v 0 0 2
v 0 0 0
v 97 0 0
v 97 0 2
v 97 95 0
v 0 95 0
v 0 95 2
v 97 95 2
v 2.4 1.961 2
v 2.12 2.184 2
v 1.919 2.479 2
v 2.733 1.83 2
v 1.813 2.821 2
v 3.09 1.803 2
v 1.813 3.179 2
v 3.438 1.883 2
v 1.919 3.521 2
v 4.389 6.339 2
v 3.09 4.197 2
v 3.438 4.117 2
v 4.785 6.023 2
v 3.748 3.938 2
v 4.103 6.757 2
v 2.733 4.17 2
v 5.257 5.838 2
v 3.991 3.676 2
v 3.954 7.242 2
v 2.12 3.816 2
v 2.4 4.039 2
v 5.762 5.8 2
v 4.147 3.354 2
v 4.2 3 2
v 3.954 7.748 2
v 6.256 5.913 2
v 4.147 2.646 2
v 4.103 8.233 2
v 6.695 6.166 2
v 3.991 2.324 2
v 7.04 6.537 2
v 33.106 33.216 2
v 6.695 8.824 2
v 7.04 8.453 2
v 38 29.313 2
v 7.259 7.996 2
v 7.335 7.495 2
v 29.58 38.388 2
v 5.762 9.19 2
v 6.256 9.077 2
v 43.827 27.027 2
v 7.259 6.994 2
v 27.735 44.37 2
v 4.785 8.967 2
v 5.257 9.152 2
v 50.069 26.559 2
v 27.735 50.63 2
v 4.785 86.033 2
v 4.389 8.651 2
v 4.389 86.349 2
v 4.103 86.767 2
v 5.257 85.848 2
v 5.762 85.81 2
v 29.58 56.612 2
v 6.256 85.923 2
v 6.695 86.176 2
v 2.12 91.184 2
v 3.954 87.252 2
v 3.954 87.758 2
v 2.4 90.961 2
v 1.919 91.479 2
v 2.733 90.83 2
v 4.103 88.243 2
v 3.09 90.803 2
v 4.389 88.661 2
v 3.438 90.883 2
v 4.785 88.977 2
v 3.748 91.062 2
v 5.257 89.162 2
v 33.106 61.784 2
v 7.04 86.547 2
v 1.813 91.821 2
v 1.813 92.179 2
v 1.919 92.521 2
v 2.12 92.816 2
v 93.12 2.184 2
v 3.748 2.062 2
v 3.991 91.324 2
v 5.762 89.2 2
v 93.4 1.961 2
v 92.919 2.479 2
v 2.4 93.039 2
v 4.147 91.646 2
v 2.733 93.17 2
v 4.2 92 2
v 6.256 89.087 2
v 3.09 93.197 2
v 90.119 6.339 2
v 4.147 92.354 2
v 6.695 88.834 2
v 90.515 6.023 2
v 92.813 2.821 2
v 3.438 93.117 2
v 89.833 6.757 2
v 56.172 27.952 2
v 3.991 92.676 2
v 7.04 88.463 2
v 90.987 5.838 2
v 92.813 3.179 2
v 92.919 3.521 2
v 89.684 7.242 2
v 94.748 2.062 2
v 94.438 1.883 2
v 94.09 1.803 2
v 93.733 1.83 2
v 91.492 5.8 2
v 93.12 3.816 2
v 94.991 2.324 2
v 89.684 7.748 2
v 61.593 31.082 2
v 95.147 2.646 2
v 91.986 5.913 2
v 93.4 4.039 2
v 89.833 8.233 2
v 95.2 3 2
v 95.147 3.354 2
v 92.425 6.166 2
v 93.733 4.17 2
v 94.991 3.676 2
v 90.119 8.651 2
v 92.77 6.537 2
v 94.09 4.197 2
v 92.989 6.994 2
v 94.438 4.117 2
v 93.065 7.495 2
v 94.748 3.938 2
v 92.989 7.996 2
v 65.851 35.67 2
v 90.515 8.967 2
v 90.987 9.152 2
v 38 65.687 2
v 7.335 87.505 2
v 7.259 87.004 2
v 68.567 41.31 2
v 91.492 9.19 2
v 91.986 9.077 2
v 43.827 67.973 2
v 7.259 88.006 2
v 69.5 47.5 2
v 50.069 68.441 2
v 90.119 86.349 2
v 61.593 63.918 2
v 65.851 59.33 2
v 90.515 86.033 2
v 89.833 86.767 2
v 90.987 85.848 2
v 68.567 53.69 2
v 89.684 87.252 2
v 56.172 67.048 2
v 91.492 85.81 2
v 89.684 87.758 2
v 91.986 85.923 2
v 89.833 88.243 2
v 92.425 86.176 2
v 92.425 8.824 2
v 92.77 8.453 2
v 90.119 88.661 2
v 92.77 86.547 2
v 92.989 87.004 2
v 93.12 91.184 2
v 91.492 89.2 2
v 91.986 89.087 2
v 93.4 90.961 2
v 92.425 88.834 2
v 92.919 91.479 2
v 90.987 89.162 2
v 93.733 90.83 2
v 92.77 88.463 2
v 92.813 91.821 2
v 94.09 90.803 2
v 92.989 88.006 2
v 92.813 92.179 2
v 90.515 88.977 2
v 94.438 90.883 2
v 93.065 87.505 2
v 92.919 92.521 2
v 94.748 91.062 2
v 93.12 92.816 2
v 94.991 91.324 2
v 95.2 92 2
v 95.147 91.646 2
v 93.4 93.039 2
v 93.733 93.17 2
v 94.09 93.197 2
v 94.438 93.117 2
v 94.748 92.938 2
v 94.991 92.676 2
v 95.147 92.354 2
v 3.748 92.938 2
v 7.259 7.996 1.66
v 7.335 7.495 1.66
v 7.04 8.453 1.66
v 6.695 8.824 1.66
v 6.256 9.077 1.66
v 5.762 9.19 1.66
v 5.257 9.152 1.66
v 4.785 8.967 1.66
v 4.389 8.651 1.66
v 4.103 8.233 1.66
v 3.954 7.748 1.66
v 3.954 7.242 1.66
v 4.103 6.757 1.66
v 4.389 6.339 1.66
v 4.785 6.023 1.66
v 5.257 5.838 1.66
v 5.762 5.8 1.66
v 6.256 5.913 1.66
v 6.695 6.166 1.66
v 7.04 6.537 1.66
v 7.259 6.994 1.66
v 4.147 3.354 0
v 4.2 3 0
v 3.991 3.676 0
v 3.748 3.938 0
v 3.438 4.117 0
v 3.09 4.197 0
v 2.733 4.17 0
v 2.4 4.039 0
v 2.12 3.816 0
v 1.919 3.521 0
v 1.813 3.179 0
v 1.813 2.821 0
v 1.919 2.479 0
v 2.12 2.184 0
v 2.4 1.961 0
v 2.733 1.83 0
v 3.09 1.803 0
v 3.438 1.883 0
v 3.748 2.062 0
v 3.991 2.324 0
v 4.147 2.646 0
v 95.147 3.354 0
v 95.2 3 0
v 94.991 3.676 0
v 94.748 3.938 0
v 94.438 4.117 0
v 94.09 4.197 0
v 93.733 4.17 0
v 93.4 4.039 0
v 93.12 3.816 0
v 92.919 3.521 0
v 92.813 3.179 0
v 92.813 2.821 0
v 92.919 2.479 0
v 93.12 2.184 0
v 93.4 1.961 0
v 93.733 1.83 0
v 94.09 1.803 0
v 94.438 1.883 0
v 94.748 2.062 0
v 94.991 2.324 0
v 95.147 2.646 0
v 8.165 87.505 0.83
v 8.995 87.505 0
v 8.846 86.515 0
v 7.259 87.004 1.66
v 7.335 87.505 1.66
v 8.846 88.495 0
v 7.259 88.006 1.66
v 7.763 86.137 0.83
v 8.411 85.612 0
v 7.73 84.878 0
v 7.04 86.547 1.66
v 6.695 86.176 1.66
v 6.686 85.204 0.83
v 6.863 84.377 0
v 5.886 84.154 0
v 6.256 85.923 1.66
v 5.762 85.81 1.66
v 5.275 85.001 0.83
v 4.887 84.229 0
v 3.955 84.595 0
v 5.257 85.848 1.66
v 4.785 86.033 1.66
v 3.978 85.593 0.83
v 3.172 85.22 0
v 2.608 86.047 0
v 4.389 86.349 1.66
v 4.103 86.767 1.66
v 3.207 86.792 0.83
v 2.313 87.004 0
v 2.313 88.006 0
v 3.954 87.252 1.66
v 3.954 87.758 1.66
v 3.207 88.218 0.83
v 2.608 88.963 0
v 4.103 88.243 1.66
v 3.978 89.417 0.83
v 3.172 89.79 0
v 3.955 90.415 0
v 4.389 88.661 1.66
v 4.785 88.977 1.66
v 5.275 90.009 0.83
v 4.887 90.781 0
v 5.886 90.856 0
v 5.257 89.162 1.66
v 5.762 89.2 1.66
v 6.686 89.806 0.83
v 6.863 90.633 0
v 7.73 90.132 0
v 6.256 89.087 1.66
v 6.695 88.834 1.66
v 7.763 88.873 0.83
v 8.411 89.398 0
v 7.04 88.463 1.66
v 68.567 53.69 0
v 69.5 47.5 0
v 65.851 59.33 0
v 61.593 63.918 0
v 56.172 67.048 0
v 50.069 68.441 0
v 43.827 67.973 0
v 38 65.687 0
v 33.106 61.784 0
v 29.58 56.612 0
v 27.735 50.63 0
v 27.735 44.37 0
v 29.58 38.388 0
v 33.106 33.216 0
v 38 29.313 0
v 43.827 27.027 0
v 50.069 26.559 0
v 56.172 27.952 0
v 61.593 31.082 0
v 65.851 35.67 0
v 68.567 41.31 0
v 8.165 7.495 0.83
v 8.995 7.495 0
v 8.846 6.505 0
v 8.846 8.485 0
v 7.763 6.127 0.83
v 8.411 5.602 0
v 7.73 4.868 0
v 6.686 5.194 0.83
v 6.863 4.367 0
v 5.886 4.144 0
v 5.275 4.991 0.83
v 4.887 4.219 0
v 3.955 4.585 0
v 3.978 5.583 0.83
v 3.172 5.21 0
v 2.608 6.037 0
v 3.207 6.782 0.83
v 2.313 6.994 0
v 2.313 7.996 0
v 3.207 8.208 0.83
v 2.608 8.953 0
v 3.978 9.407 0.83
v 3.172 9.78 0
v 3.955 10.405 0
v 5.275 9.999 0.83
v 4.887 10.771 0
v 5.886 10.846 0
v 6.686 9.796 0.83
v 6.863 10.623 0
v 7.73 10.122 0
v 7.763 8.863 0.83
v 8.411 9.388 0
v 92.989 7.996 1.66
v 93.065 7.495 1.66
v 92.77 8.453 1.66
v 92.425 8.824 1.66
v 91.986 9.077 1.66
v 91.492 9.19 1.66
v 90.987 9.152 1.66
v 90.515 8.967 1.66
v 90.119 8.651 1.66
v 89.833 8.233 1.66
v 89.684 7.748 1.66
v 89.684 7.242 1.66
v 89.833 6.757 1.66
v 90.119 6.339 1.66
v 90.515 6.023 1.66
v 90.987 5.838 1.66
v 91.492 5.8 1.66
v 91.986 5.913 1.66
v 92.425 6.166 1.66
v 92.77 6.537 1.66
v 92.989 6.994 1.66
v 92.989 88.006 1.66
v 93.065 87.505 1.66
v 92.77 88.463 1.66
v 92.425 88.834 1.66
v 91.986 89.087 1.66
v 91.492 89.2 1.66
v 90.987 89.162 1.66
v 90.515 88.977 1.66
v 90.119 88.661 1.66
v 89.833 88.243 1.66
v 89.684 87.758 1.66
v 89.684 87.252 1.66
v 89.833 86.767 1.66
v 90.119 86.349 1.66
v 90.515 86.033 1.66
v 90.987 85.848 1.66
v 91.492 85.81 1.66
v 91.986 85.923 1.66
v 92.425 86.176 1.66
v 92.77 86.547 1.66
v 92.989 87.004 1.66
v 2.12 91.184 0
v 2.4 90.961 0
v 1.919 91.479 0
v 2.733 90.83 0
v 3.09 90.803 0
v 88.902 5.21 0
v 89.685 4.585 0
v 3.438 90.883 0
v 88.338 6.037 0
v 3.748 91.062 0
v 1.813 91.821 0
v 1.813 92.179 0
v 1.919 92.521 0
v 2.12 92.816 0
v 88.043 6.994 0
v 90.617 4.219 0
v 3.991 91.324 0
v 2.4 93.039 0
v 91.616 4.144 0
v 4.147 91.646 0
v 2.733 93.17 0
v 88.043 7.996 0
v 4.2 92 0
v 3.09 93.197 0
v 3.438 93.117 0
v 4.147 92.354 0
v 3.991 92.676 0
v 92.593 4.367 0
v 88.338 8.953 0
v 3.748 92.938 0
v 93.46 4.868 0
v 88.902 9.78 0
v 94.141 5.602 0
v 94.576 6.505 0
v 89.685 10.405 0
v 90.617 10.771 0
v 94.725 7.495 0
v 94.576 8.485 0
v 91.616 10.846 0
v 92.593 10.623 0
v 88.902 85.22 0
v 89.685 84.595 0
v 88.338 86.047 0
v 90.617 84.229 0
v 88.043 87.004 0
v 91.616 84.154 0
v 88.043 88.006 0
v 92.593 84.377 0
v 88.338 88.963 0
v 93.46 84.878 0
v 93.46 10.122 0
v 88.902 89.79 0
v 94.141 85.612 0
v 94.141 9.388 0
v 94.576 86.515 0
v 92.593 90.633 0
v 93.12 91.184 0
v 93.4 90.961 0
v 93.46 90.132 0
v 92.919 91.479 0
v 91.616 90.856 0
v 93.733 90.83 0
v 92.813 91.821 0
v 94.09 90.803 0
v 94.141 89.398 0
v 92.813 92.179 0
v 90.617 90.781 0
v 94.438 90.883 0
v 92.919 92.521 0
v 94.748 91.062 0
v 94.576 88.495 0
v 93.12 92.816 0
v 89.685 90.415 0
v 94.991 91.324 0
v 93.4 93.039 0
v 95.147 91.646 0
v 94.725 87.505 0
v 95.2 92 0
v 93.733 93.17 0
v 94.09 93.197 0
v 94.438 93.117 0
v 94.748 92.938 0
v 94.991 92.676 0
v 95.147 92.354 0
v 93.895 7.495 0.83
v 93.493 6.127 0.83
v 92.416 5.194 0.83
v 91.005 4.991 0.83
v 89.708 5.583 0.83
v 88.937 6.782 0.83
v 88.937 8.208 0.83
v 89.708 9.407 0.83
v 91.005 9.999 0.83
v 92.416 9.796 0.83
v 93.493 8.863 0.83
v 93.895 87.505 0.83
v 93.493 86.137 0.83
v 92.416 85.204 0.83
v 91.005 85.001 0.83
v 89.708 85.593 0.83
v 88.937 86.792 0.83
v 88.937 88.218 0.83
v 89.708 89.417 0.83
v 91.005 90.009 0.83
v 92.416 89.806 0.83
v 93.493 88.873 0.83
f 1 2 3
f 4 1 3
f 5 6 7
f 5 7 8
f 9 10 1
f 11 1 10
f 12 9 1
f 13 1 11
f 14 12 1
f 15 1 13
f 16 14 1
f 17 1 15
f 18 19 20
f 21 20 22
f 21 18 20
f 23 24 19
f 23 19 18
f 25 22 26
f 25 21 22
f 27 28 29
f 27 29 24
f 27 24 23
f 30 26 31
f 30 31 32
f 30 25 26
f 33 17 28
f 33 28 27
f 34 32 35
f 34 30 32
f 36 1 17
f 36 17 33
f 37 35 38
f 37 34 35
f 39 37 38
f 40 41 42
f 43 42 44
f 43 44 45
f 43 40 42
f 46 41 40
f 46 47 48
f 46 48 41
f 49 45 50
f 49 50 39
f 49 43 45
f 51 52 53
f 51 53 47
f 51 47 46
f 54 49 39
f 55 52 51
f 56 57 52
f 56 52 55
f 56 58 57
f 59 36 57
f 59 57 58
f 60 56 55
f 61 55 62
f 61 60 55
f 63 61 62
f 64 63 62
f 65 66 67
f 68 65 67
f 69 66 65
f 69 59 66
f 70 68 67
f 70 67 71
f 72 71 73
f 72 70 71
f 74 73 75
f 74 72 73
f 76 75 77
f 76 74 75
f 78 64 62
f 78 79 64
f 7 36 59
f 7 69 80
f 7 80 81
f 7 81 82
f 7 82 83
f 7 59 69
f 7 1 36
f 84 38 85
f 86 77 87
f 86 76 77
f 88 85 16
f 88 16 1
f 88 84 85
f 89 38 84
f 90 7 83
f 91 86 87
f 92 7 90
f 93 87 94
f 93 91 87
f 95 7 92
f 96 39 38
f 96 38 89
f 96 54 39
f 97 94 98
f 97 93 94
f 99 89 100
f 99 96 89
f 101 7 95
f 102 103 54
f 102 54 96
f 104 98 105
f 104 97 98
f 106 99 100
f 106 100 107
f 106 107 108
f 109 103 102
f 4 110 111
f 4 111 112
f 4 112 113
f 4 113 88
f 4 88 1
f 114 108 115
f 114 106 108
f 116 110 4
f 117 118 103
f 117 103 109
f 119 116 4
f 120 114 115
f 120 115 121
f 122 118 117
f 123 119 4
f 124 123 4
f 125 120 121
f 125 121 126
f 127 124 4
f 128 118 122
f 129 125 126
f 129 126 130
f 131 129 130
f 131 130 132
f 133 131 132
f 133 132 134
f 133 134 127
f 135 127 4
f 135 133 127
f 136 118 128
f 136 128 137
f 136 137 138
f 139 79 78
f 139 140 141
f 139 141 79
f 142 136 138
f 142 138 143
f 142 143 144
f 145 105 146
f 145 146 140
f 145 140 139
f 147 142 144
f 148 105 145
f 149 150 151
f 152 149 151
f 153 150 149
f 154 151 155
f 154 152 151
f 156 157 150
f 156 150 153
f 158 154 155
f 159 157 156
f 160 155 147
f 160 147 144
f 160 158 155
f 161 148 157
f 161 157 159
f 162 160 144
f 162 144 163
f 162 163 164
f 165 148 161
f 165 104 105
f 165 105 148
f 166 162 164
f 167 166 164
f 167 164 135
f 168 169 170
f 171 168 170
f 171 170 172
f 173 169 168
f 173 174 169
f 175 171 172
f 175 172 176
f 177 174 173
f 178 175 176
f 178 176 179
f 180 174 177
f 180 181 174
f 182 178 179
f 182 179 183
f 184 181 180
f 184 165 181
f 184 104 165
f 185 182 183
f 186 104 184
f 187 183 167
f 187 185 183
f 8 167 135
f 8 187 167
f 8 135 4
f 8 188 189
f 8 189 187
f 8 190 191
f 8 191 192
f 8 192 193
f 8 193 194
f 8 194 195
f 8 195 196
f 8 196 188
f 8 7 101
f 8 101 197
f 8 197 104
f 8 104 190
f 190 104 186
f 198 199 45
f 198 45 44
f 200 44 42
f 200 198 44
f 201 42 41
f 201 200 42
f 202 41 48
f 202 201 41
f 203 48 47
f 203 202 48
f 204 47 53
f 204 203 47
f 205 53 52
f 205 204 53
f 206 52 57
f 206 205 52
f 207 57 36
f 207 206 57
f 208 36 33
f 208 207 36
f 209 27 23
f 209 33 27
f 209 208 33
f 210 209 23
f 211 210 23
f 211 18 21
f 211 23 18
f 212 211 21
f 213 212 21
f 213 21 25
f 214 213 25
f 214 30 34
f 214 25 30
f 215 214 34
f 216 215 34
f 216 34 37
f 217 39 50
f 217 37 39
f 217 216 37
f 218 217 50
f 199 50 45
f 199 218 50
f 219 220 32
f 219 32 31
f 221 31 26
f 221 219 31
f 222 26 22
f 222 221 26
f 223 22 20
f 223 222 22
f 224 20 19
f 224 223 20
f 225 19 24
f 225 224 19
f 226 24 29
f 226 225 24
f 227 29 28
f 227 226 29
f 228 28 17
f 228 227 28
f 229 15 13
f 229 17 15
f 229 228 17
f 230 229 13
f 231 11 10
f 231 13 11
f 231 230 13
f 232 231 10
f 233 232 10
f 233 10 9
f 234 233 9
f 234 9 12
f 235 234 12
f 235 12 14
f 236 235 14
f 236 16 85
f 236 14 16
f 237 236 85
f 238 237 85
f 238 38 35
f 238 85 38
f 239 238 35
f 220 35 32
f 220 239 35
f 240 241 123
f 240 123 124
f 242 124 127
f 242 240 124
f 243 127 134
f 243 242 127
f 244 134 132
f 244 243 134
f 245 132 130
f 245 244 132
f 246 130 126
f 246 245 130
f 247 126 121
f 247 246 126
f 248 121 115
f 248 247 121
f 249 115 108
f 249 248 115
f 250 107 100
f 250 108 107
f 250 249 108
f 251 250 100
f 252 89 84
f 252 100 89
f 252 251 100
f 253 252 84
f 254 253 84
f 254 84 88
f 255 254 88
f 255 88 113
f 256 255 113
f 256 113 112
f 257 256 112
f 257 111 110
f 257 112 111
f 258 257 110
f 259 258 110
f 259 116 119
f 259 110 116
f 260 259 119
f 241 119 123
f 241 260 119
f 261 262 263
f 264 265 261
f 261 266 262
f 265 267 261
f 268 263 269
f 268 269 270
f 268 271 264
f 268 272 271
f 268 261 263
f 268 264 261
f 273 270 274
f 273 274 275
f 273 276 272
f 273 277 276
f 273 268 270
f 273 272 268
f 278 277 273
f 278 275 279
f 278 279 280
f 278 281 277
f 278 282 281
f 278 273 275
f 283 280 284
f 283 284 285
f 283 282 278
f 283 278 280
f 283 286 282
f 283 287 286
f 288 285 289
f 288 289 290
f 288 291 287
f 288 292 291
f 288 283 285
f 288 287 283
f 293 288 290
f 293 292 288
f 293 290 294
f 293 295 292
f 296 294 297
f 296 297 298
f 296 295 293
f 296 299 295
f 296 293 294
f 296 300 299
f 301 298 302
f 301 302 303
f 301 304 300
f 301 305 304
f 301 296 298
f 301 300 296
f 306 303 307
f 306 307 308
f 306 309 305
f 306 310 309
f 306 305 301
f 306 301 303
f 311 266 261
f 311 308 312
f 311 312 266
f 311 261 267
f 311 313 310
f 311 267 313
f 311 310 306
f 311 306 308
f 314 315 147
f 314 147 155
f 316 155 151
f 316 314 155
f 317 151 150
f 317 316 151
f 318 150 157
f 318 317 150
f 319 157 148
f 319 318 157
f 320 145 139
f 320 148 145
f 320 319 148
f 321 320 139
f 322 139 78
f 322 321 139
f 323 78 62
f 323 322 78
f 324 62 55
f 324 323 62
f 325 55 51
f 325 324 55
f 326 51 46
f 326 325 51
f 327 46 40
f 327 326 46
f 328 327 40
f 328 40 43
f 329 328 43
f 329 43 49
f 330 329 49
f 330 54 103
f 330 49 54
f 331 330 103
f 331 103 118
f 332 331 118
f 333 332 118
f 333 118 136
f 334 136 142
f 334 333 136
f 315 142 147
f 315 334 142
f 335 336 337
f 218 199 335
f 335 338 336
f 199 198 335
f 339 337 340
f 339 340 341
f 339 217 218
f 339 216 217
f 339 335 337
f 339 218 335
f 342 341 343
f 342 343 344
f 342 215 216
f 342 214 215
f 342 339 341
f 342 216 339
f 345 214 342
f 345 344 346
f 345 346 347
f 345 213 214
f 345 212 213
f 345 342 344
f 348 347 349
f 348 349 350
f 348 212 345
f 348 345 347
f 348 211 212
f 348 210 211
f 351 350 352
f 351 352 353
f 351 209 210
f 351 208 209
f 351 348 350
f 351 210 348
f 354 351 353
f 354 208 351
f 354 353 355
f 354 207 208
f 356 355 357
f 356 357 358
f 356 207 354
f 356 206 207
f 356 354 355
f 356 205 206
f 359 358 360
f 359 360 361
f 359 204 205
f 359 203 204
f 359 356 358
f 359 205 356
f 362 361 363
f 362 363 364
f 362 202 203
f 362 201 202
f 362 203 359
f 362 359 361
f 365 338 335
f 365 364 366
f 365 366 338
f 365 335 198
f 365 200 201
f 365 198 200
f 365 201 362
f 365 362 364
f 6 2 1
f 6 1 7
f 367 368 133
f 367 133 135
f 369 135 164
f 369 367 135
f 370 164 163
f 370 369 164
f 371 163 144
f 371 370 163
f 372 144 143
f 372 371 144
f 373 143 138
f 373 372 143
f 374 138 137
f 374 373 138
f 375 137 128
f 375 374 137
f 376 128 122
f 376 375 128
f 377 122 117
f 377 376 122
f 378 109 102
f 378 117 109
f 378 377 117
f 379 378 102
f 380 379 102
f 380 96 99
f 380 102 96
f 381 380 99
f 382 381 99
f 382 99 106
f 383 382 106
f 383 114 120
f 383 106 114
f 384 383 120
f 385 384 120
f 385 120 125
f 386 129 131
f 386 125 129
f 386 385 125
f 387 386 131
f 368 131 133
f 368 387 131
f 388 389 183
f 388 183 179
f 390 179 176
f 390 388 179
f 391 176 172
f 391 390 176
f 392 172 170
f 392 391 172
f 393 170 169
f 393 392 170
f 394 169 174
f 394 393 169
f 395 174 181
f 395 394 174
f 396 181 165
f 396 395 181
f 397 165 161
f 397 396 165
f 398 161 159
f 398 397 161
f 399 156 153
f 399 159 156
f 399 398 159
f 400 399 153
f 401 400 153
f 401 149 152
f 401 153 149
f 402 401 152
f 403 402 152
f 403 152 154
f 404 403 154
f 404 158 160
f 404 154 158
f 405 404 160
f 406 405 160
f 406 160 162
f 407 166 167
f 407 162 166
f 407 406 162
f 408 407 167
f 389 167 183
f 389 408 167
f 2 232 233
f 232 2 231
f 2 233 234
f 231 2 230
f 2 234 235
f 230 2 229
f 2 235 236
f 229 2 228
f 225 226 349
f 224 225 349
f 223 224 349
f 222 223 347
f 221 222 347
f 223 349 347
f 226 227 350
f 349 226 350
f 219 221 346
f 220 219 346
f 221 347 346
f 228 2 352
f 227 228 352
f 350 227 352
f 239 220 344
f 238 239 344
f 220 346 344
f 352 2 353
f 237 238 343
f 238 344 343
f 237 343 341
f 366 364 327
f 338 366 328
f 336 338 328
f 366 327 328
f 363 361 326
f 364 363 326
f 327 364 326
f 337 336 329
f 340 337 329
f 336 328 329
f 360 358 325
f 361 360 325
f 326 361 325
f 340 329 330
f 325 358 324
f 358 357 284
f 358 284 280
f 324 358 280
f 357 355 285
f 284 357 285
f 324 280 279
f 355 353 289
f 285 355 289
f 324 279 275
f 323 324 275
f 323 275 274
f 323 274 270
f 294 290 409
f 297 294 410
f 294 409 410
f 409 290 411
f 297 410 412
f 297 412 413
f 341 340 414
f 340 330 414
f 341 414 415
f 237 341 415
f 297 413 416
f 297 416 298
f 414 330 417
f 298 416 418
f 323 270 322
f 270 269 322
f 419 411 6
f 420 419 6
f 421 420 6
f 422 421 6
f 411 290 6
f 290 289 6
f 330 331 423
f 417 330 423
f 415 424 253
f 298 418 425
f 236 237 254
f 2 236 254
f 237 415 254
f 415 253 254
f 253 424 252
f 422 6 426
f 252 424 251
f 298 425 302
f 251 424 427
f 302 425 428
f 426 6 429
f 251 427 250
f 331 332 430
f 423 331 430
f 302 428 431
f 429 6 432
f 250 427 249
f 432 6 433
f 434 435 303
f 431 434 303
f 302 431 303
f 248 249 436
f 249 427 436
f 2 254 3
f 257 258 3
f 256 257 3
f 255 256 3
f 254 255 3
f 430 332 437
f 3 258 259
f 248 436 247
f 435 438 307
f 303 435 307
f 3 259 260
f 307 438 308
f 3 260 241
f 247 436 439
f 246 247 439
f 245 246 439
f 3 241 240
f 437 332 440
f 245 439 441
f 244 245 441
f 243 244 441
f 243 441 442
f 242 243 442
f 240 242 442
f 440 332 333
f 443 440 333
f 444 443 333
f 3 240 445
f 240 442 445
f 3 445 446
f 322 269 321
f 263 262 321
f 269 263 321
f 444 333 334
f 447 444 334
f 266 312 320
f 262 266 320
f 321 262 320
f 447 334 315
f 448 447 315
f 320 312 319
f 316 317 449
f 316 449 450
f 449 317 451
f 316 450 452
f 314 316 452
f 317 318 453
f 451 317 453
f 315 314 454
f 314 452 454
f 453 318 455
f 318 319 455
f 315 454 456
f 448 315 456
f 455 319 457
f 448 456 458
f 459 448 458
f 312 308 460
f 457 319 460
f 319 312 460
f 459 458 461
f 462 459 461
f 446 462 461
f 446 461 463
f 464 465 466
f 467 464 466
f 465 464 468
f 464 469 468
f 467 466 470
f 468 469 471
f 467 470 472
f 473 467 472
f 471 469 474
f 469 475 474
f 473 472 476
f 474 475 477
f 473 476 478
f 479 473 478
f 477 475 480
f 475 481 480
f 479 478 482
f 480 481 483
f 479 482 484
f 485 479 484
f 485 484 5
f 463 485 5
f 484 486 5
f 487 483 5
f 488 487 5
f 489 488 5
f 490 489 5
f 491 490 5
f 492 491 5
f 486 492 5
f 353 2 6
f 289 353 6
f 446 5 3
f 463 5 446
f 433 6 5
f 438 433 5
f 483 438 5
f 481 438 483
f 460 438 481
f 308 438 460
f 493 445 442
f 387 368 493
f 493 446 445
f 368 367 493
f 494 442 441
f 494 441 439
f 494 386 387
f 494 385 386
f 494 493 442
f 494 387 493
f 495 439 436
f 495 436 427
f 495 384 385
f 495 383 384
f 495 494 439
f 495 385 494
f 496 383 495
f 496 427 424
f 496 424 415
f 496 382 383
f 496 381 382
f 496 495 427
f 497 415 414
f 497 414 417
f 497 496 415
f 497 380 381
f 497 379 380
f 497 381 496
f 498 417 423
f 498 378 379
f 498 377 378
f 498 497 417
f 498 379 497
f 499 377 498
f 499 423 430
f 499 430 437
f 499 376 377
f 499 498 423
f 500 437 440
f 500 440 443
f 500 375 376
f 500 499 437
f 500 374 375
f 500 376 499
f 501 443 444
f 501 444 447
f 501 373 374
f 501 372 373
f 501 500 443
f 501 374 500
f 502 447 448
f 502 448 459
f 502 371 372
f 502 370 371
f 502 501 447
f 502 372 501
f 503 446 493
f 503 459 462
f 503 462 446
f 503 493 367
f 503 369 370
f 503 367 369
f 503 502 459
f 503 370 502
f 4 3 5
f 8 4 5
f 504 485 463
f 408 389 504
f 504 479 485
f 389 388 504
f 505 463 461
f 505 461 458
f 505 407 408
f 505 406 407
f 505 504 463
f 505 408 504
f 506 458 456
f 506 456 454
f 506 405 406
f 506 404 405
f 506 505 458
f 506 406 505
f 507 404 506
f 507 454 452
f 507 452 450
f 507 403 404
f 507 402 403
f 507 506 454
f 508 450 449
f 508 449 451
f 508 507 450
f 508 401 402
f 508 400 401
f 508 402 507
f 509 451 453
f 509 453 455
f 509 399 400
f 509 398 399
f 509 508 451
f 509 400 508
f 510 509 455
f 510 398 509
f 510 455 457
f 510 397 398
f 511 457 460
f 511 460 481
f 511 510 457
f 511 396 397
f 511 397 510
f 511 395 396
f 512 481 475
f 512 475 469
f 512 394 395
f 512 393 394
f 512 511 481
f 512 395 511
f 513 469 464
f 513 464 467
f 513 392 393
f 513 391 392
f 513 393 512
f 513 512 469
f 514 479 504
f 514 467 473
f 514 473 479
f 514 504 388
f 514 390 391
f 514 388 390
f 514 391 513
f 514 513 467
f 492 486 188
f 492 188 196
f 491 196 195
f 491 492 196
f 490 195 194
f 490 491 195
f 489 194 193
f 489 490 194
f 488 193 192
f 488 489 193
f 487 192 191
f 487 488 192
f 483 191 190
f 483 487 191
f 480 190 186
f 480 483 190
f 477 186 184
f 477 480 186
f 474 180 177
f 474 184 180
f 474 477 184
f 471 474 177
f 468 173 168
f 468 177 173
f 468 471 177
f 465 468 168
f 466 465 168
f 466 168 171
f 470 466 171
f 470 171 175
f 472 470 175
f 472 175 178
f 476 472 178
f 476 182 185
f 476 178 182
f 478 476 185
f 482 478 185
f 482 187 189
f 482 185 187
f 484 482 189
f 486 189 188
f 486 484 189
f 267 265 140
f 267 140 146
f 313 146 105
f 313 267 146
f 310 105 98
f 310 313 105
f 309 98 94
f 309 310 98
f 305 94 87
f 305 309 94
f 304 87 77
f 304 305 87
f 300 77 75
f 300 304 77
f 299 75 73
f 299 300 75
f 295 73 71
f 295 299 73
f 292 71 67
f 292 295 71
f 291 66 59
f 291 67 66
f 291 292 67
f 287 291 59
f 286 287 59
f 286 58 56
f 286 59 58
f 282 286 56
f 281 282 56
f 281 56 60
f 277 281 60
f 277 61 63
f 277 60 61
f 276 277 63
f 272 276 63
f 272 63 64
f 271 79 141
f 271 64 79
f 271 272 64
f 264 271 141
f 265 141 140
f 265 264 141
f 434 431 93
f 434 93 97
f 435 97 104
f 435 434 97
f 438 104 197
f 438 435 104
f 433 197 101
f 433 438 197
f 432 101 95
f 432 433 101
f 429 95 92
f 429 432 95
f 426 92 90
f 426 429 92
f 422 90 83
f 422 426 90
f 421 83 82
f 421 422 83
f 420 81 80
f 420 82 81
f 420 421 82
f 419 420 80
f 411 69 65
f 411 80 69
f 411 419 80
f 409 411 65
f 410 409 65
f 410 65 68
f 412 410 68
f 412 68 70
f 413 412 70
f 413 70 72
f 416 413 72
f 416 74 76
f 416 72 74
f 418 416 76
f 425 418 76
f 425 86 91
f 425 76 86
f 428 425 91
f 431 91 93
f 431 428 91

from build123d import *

# Parameters (mm, degrees)
PLATE_SKETCH_W                 = 97
PLATE_SKETCH_H                 = 95
PLATE_DEPTH                    = 2
M2_FOOT_SCREW_HOLES_DEPTH      = 136.786597277
M2_FOOT_SCREW_HOLES_DEPTH_BACK = 136.786597277
M2_FOOT_SCREW_HOLES_SKETCH_R   = 1.2
M3_STACK_ROD_HOLES_DEPTH       = 136.786597277
M3_STACK_ROD_HOLES_DEPTH_BACK  = 136.786597277
M3_STACK_ROD_HOLES_SKETCH_R    = 1.7
M3_COUNTERSINKS_SIZE           = 1.66
CAMERA_APERTURE_DEPTH          = 136.786597277
CAMERA_APERTURE_DEPTH_BACK     = 136.786597277
CAMERA_APERTURE_SKETCH_R       = 21


with BuildPart() as part:
    # Plate sketch → Plate (new body)
    with BuildSketch(Plane.XY):
        with Locations((48.5, 47.5)):
            Rectangle(PLATE_SKETCH_W, PLATE_SKETCH_H)
    extrude(amount=PLATE_DEPTH)

    # M2 foot screw holes sketch → M2 foot screw holes (cut, two sides: drawn at the far end of the back side and taken through both)
    with BuildSketch(Plane.XY.offset(-M2_FOOT_SCREW_HOLES_DEPTH_BACK)):
        with Locations((3, 3)):
            Circle(M2_FOOT_SCREW_HOLES_SKETCH_R)
        with Locations((94, 3)):
            Circle(M2_FOOT_SCREW_HOLES_SKETCH_R)
        with Locations((3, 92)):
            Circle(M2_FOOT_SCREW_HOLES_SKETCH_R)
        with Locations((94, 92)):
            Circle(M2_FOOT_SCREW_HOLES_SKETCH_R)
    extrude(amount=M2_FOOT_SCREW_HOLES_DEPTH + M2_FOOT_SCREW_HOLES_DEPTH_BACK, mode=Mode.SUBTRACT)

    # M3 stack rod holes sketch → M3 stack rod holes (cut, two sides: drawn at the far end of the back side and taken through both)
    with BuildSketch(Plane.XY.offset(-M3_STACK_ROD_HOLES_DEPTH_BACK)):
        with Locations((5.635, 7.495)):
            Circle(M3_STACK_ROD_HOLES_SKETCH_R)
        with Locations((91.365, 7.495)):
            Circle(M3_STACK_ROD_HOLES_SKETCH_R)
        with Locations((5.635, 87.505)):
            Circle(M3_STACK_ROD_HOLES_SKETCH_R)
        with Locations((91.365, 87.505)):
            Circle(M3_STACK_ROD_HOLES_SKETCH_R)
    extrude(amount=M3_STACK_ROD_HOLES_DEPTH + M3_STACK_ROD_HOLES_DEPTH_BACK, mode=Mode.SUBTRACT)

    # M3 countersinks
    m3_countersinks_edges = [part.edges().sort_by_distance(p)[0] for p in [
        (89.665, 7.495, 0),
        (3.935, 87.505, 0),
        (89.665, 87.505, 0),
        (3.935, 7.495, 0),
    ]]
    chamfer(m3_countersinks_edges, length=M3_COUNTERSINKS_SIZE)

    # Camera aperture sketch → Camera aperture (cut, two sides: drawn at the far end of the back side and taken through both)
    with BuildSketch(Plane.XY.offset(-CAMERA_APERTURE_DEPTH_BACK)):
        with Locations((48.5, 47.5)):
            Circle(CAMERA_APERTURE_SKETCH_R)
    extrude(amount=CAMERA_APERTURE_DEPTH + CAMERA_APERTURE_DEPTH_BACK, mode=Mode.SUBTRACT)


solid = part.part
